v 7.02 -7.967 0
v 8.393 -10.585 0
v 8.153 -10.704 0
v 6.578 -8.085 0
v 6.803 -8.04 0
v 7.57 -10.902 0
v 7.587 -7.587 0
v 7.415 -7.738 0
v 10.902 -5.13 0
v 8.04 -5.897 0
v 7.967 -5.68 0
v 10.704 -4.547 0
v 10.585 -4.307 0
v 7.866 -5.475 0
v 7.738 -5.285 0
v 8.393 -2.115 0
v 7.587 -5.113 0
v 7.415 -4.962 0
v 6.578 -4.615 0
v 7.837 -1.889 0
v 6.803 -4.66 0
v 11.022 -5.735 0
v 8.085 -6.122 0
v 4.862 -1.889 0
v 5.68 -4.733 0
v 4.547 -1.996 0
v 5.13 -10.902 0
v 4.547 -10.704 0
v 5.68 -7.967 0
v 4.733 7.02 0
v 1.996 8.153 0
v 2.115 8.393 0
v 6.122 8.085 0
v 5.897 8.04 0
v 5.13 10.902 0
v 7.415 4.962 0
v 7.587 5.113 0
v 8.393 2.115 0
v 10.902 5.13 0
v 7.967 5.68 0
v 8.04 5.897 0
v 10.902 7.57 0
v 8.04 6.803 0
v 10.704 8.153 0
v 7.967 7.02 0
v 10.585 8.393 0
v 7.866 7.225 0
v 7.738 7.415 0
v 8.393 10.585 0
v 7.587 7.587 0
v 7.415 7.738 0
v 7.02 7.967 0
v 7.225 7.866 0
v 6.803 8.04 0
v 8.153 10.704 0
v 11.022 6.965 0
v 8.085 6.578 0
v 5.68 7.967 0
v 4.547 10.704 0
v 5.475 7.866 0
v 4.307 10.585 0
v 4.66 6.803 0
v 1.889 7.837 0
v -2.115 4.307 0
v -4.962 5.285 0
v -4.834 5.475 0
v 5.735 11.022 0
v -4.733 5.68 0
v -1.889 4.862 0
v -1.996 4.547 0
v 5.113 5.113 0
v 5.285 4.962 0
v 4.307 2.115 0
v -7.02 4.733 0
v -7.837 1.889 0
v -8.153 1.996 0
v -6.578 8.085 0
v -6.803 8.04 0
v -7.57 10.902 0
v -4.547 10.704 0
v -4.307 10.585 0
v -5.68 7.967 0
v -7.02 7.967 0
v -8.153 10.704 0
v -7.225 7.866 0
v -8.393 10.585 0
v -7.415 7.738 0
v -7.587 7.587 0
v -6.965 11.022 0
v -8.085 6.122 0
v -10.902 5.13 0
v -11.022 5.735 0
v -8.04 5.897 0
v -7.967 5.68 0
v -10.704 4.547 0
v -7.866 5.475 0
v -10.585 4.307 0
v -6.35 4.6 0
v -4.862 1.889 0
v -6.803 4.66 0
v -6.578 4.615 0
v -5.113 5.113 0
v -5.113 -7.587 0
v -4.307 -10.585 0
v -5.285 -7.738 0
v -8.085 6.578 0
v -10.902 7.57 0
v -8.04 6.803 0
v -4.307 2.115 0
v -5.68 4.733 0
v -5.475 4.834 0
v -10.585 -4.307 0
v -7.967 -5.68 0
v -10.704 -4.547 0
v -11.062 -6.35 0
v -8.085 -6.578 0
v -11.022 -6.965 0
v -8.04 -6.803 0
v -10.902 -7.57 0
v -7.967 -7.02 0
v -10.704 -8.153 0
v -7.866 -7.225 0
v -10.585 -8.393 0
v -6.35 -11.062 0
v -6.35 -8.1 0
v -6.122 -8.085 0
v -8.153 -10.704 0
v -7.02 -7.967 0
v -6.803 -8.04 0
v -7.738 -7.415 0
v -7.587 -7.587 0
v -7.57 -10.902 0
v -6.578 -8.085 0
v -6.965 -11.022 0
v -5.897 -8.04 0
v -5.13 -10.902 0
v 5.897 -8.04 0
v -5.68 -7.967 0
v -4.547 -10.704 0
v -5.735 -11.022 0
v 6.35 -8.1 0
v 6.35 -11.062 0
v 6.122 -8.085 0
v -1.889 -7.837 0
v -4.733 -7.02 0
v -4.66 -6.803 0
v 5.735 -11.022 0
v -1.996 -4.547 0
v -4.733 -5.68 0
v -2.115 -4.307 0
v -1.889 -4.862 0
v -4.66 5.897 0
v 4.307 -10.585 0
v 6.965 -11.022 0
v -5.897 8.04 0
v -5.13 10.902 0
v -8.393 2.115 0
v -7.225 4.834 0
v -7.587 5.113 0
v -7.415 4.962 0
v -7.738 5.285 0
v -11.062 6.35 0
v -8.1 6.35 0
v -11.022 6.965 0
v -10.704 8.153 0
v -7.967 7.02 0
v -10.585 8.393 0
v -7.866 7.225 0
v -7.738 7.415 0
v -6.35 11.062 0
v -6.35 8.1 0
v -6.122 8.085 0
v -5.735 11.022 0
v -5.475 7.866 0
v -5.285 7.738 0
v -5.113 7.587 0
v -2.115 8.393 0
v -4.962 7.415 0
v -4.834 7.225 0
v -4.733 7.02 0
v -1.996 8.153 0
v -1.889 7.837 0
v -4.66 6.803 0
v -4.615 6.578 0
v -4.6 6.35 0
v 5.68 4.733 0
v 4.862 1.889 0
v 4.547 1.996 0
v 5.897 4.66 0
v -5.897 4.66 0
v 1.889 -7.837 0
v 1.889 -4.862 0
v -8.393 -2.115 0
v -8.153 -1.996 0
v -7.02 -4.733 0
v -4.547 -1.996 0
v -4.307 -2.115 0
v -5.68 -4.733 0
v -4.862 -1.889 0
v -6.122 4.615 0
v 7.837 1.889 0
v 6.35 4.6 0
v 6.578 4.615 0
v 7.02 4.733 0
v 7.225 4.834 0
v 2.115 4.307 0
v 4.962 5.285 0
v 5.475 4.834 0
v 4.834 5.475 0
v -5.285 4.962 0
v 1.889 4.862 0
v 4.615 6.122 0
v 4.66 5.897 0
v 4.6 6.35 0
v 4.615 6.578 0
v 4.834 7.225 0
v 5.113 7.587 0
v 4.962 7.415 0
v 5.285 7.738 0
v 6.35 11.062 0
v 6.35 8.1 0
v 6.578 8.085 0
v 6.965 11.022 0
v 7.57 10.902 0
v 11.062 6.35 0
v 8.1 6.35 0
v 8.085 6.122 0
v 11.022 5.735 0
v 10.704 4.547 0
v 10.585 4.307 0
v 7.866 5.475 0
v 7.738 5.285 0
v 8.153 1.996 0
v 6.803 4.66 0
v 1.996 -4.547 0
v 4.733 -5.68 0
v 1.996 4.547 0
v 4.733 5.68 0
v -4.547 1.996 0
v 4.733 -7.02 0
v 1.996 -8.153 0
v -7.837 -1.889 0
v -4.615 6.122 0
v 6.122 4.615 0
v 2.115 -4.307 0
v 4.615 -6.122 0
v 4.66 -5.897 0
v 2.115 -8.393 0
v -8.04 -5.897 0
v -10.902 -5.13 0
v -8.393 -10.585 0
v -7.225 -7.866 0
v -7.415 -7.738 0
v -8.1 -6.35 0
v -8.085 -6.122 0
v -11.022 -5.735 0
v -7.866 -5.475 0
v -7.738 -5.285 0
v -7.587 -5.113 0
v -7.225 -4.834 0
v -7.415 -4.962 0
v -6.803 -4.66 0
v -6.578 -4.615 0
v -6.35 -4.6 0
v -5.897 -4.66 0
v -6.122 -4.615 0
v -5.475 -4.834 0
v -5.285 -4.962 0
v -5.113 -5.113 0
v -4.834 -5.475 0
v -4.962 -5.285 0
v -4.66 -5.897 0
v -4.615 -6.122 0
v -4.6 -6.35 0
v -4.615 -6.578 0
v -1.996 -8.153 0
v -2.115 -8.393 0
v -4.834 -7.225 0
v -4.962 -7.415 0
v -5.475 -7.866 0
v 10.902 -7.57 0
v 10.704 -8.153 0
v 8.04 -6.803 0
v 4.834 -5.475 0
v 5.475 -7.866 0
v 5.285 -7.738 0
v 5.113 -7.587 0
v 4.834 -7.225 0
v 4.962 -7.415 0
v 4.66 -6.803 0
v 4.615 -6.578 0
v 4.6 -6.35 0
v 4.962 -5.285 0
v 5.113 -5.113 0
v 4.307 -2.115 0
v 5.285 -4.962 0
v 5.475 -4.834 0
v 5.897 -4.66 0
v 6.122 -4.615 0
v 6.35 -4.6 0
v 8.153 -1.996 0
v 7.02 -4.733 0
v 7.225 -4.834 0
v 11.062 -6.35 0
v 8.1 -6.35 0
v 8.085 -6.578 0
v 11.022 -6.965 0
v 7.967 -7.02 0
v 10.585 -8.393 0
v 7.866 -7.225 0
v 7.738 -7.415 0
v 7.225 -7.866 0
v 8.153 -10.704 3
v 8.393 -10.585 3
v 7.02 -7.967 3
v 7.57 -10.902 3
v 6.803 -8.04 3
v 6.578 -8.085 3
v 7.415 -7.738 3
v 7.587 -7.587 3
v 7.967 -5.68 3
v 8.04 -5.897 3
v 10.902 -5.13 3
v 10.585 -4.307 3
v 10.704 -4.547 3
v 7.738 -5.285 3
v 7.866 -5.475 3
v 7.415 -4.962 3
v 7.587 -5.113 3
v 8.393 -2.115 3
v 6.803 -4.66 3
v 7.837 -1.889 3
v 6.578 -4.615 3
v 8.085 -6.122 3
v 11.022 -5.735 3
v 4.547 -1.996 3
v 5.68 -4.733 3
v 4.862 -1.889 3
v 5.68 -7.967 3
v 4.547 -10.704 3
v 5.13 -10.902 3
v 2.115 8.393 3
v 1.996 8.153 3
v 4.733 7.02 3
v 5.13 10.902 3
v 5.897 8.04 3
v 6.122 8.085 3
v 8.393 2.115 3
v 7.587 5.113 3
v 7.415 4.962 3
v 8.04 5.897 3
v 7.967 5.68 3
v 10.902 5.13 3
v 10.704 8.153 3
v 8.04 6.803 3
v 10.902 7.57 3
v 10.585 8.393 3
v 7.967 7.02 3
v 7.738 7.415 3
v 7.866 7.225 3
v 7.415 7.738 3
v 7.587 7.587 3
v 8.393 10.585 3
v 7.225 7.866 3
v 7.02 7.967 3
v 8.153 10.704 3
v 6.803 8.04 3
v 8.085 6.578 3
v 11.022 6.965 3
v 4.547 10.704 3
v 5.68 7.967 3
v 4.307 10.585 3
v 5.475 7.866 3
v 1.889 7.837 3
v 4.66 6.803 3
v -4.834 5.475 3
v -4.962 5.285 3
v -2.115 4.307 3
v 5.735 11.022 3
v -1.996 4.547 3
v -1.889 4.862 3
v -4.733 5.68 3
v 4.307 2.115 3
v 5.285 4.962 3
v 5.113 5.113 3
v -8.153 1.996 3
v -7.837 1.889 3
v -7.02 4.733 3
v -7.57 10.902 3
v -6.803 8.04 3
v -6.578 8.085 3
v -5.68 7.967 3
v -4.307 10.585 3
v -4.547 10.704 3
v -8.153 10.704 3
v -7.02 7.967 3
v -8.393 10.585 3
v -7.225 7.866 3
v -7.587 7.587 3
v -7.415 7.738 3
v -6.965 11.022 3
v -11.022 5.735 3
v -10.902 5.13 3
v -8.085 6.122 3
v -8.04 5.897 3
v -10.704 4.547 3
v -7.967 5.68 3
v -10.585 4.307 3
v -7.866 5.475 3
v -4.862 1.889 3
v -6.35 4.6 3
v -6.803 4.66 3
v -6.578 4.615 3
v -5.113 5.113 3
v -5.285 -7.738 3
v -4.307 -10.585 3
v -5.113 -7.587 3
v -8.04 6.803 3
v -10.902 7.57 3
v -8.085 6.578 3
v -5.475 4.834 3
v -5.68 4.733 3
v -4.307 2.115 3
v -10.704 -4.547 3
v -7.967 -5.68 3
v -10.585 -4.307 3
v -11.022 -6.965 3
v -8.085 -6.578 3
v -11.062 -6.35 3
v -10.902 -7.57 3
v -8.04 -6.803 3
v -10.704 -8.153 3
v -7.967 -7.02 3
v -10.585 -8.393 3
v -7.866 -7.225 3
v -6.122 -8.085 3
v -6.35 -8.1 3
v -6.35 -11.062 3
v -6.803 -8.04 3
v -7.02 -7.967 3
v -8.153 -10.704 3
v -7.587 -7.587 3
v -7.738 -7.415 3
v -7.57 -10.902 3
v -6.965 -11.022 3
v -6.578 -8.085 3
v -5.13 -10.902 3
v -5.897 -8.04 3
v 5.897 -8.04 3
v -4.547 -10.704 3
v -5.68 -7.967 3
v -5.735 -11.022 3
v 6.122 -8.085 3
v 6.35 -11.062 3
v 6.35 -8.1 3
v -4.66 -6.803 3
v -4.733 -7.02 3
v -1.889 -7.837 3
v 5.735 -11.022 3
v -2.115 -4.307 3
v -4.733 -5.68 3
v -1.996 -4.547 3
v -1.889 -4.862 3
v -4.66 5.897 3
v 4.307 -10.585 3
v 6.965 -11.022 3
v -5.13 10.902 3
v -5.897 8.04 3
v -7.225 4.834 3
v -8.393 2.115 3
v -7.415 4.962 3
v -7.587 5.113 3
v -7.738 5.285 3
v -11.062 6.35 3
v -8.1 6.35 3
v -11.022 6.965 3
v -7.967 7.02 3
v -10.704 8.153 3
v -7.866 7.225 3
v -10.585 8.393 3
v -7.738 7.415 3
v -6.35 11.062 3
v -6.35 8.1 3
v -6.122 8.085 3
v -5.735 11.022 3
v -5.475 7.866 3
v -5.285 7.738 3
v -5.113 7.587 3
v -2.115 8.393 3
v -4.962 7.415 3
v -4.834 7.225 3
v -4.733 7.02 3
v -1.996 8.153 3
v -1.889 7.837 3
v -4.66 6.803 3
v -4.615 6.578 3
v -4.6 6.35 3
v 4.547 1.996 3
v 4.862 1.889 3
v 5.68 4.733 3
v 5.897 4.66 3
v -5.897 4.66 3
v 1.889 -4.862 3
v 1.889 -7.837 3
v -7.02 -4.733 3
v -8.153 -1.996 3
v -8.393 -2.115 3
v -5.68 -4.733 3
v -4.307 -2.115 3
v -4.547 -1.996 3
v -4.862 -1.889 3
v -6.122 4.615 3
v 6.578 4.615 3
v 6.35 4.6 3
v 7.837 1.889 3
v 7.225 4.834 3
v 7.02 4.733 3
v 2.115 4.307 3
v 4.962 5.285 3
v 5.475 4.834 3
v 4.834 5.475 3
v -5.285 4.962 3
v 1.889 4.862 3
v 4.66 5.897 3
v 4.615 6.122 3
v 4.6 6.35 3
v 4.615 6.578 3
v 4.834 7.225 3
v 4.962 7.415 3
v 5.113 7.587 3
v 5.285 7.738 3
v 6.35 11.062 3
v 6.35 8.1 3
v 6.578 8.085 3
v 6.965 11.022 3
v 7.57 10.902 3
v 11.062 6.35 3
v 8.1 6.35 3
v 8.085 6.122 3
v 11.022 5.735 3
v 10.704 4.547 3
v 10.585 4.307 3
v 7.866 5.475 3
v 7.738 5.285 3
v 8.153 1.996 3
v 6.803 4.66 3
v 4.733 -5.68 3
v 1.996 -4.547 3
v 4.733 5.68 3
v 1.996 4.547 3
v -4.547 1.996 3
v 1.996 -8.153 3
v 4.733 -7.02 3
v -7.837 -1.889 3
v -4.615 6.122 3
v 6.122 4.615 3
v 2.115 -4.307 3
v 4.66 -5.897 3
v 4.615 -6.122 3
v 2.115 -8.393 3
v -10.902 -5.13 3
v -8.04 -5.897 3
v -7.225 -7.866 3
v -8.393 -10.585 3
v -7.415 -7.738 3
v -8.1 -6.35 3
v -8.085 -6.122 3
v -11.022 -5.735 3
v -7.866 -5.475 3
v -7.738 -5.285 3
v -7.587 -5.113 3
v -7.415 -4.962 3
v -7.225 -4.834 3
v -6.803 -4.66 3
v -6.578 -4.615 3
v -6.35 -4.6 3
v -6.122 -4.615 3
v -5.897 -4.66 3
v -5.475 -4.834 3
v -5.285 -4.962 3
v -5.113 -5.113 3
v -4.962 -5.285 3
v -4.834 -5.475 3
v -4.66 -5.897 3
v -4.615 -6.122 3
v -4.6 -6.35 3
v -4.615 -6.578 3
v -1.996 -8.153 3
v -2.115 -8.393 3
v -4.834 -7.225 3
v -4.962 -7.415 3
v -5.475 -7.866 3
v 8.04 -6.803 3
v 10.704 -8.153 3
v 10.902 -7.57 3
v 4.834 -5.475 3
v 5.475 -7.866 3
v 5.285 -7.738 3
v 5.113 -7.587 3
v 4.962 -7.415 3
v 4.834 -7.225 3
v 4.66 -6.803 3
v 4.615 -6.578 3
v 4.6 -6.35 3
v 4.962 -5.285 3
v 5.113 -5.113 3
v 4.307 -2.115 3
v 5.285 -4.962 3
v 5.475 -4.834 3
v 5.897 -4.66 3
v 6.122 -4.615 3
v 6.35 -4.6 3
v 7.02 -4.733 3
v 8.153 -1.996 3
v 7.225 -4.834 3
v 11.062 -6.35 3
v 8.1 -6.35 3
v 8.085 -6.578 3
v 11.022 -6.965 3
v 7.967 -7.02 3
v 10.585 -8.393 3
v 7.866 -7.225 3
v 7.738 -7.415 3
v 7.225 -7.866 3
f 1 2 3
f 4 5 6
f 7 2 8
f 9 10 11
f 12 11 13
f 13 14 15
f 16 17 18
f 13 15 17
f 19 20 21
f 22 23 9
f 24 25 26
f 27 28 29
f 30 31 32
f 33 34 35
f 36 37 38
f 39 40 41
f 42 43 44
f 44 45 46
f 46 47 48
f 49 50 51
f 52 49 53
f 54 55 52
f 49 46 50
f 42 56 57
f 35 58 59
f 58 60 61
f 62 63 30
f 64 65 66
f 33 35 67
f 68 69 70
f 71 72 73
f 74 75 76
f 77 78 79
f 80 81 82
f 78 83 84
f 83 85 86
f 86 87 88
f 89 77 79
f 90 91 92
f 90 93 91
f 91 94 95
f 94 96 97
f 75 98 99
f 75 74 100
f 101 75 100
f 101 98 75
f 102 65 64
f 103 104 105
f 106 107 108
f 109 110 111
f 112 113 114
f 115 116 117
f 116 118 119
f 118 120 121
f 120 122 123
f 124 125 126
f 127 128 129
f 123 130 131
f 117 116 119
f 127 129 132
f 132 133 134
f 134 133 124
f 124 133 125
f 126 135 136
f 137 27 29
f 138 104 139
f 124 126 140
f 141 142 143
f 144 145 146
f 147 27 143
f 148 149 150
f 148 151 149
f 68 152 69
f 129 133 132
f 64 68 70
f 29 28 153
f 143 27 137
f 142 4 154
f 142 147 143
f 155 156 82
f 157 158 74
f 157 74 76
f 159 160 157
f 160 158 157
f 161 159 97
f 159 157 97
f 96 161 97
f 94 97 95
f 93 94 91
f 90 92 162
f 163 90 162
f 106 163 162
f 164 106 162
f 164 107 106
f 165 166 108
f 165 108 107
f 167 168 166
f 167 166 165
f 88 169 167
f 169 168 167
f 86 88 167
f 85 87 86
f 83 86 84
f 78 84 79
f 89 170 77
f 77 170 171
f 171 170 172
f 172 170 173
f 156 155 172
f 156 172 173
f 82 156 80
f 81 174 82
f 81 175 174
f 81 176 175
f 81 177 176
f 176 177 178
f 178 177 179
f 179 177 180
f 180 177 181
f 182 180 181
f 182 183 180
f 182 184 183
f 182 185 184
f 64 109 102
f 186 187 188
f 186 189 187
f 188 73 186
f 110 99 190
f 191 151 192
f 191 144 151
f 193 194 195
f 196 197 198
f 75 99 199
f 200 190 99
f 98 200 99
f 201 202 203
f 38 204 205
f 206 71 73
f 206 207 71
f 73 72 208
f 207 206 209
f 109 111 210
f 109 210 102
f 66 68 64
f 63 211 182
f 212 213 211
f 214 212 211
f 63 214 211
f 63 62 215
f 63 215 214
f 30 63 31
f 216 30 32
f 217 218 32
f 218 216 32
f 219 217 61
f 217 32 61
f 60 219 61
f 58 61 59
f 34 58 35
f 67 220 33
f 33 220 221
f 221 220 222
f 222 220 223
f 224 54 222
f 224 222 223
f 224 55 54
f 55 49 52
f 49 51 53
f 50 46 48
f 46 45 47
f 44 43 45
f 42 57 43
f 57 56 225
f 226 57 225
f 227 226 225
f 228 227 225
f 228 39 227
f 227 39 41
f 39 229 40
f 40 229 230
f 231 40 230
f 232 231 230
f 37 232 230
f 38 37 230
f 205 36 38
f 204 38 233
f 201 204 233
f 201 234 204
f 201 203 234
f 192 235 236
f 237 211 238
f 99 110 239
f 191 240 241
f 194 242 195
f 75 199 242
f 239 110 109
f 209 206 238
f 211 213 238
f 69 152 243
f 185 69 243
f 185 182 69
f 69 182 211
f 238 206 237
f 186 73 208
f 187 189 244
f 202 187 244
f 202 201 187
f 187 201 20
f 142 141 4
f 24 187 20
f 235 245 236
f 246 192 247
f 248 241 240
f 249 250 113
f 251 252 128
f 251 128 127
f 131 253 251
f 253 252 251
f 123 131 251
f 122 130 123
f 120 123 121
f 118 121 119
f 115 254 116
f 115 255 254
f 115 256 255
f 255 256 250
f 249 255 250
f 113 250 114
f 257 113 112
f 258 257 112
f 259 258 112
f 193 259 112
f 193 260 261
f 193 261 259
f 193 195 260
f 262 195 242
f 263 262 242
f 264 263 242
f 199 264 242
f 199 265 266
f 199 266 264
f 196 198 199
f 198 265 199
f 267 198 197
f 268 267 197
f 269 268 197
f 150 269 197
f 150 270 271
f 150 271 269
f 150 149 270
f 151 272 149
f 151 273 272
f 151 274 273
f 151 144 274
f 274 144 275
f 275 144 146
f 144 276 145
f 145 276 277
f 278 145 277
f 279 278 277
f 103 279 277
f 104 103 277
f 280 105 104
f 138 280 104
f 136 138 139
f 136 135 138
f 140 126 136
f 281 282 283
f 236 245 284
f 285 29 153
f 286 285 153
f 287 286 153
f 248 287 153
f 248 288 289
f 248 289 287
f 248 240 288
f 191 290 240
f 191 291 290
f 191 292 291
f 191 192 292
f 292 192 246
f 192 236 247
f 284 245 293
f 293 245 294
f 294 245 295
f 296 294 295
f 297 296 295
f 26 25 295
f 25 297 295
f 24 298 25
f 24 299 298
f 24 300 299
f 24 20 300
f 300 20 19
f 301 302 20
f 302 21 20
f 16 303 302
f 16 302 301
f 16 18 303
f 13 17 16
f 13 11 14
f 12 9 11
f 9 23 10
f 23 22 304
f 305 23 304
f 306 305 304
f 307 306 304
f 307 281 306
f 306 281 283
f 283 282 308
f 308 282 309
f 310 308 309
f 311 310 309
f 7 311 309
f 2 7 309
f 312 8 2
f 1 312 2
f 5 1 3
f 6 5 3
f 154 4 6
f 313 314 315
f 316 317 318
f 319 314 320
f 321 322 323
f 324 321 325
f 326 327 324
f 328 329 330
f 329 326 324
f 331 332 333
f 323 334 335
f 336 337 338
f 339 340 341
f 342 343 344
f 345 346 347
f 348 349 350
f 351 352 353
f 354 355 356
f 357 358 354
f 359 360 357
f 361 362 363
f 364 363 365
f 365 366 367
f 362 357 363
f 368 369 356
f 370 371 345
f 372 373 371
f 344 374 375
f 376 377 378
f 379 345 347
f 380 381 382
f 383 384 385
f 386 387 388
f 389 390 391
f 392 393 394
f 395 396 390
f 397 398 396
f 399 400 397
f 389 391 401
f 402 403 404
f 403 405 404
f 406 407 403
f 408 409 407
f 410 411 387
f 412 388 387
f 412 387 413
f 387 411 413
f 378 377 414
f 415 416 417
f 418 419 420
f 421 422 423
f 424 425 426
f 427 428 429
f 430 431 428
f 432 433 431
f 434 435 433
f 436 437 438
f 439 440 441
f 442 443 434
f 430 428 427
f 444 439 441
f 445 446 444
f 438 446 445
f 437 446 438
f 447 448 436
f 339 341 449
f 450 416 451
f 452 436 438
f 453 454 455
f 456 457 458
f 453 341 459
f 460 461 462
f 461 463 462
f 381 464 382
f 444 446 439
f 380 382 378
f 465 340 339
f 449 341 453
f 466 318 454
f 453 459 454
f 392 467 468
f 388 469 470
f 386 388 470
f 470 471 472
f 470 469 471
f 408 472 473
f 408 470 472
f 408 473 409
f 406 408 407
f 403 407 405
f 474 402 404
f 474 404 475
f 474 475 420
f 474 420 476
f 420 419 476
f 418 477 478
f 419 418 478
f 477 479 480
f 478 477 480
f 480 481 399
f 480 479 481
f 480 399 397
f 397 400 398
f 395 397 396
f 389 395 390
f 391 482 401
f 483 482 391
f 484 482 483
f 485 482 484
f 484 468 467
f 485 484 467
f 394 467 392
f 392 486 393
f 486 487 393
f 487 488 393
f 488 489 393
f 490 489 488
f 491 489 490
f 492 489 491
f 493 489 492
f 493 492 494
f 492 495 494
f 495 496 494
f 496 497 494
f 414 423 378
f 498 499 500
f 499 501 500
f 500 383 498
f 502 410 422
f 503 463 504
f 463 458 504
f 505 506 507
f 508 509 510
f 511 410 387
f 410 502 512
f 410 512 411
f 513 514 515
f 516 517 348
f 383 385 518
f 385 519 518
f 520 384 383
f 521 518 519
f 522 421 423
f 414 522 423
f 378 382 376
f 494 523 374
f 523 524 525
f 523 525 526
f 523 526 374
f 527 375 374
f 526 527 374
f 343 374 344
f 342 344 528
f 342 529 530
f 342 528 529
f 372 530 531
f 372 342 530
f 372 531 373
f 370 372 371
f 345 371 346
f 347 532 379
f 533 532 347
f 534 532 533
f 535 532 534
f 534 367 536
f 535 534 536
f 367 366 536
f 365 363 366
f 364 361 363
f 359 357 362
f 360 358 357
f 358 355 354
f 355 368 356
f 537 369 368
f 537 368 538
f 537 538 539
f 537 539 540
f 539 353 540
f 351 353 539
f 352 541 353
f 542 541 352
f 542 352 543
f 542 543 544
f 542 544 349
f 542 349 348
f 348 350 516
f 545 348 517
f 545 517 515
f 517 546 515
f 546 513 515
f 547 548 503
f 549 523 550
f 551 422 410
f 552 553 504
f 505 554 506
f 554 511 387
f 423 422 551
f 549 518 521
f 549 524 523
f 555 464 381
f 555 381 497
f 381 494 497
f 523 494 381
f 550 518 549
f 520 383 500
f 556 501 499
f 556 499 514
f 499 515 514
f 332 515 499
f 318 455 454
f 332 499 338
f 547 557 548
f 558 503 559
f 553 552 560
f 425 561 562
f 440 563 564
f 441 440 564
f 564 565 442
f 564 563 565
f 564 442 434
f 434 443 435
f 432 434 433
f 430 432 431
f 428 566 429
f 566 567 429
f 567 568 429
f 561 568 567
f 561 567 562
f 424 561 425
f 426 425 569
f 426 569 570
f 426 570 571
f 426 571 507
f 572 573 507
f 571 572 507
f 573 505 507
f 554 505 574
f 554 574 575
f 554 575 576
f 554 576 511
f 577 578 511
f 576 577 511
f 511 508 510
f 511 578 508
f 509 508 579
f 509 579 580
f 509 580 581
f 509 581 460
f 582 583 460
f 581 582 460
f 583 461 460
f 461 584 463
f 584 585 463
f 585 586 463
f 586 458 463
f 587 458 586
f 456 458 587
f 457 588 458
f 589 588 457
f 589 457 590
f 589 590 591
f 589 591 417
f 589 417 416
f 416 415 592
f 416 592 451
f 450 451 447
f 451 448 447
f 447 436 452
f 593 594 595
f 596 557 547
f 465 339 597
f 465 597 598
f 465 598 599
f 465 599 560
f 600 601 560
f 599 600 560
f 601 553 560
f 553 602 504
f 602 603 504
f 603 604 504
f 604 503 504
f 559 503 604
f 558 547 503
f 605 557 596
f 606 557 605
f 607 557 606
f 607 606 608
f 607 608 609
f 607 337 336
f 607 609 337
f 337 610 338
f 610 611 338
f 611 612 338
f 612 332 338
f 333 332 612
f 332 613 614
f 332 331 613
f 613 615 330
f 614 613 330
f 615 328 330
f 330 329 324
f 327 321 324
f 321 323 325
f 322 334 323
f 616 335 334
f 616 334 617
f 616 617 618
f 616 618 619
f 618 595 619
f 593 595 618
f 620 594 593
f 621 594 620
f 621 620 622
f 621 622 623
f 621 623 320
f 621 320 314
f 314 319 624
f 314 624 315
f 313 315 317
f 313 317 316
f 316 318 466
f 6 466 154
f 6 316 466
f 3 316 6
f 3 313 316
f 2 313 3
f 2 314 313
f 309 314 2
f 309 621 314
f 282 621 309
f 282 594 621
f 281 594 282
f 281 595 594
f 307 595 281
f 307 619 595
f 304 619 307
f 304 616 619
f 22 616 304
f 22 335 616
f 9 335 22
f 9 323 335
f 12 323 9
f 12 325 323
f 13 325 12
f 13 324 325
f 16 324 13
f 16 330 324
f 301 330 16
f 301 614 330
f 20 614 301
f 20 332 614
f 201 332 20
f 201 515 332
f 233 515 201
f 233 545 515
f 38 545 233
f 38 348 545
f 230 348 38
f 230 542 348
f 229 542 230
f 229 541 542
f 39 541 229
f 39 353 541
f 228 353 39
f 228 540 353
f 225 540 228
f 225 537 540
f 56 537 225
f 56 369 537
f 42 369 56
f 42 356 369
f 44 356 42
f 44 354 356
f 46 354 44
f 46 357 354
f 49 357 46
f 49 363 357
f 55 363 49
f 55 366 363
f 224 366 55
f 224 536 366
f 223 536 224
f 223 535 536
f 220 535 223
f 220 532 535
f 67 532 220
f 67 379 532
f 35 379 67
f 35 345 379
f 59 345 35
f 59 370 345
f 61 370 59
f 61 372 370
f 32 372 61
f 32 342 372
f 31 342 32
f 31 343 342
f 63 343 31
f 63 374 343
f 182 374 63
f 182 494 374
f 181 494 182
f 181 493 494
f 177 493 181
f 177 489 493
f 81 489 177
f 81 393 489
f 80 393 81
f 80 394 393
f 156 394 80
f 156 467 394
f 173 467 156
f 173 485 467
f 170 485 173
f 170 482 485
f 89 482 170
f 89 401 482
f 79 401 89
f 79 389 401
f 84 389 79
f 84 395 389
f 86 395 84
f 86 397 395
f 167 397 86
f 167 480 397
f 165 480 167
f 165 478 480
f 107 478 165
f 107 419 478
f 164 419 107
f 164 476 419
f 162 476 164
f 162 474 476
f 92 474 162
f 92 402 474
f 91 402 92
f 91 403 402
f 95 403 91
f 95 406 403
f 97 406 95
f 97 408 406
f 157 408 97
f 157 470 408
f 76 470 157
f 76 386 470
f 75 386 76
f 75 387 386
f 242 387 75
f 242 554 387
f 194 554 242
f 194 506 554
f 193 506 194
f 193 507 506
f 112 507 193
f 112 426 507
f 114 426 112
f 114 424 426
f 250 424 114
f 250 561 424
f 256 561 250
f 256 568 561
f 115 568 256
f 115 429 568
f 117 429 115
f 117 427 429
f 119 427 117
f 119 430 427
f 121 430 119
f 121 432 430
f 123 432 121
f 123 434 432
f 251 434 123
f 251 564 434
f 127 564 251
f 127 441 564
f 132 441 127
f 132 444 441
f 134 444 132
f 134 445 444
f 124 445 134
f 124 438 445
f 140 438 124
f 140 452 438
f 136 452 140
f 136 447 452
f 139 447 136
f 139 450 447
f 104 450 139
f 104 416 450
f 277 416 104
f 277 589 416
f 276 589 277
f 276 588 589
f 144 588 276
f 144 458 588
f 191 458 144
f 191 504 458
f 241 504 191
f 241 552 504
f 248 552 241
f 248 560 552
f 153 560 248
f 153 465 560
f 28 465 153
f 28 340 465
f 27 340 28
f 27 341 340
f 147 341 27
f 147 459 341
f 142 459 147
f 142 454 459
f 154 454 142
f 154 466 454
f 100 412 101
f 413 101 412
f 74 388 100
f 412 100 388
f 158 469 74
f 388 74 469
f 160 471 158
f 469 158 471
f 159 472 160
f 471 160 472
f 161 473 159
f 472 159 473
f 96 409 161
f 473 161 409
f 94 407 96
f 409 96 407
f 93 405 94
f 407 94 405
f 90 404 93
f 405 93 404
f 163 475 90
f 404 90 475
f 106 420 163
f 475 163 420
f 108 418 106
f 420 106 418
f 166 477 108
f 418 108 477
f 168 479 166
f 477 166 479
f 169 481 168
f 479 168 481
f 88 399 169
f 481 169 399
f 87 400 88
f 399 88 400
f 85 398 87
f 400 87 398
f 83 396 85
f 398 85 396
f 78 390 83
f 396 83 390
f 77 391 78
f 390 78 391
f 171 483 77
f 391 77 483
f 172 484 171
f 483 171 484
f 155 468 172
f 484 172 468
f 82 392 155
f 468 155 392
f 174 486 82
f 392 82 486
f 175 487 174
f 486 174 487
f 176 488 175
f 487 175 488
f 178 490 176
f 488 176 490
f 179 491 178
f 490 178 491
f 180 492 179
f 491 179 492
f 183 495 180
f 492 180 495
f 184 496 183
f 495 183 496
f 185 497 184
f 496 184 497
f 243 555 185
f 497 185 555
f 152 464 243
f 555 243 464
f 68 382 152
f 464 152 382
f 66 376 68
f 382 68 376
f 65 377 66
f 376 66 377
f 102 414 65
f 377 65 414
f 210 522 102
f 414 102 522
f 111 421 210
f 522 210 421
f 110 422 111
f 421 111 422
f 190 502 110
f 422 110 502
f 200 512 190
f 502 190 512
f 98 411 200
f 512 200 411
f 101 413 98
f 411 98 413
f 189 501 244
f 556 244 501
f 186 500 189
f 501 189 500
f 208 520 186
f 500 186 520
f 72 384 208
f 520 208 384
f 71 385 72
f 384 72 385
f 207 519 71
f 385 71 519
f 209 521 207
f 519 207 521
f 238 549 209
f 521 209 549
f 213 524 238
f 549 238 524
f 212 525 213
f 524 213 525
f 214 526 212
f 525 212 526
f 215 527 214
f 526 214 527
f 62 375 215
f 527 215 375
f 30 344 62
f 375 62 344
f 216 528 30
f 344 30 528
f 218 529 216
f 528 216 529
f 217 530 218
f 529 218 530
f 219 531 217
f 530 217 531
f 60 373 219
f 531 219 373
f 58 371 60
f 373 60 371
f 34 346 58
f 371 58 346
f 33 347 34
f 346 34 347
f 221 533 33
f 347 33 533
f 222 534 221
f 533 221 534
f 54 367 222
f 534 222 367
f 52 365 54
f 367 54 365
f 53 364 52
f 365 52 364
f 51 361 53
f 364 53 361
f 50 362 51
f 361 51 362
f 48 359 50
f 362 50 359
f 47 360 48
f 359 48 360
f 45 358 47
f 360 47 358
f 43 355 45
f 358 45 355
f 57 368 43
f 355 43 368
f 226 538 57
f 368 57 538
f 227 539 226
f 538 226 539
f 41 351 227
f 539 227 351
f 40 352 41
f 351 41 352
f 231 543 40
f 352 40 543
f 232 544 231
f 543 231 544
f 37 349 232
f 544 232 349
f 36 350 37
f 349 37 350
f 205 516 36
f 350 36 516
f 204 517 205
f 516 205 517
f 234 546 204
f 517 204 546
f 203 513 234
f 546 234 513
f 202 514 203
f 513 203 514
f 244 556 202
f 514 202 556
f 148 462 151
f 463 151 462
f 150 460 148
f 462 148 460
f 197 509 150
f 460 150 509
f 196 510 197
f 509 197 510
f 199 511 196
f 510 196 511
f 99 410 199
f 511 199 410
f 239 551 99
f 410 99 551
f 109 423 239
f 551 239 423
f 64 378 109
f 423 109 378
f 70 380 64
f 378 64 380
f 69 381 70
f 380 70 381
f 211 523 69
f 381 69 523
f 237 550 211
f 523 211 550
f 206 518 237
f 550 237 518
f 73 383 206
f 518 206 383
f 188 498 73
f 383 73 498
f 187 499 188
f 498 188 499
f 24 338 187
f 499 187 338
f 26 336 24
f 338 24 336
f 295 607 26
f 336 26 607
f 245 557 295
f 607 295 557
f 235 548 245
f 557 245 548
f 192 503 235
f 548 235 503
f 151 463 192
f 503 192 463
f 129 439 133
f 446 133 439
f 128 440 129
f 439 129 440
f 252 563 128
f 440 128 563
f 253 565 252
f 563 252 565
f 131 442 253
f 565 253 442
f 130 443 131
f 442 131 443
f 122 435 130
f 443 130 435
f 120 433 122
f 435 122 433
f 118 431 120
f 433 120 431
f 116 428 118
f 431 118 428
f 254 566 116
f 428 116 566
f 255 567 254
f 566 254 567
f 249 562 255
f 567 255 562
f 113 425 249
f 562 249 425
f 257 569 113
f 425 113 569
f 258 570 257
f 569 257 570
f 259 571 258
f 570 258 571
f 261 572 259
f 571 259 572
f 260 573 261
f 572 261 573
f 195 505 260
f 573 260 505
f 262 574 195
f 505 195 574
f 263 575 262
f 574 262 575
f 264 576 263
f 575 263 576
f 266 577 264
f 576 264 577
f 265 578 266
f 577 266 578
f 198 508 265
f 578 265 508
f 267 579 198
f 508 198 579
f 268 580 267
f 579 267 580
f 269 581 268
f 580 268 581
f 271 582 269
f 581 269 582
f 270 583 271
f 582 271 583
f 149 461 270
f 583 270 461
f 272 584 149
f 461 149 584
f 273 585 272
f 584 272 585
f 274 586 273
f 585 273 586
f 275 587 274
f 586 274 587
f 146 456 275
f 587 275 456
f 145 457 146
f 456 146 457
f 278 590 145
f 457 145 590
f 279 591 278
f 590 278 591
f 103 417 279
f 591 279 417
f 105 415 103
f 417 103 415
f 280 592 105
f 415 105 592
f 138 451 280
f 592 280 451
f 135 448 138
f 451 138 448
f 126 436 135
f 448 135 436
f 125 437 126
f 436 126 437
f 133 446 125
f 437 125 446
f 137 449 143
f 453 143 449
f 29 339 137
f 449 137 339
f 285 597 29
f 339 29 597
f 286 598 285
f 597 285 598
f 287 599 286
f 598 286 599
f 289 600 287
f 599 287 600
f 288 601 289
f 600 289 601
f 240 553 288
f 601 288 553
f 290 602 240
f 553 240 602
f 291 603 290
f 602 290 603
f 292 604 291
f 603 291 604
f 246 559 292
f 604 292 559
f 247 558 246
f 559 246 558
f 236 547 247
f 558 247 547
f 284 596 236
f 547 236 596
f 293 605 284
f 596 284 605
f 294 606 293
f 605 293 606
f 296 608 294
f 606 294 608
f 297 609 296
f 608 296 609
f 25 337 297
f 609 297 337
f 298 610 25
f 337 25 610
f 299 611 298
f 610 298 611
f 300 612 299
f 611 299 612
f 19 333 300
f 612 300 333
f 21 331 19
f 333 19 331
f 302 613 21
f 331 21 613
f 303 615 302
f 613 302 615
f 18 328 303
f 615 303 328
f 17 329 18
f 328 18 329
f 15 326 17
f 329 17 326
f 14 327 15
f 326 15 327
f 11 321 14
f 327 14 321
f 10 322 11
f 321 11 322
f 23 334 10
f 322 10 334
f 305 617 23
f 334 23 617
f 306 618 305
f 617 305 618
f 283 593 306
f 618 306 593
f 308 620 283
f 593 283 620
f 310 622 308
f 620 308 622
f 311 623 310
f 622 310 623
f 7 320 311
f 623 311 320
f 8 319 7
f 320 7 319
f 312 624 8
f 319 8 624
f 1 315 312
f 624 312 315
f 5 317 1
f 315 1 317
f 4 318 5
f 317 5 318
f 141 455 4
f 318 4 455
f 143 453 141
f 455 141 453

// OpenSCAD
// file: ../lib/TOGShapeLib-v1.scad
module tog_shapelib_rounded_beveled_square(size, bevel_size, rounding_radius, offset=0) {
	// Could special-case these, but in the meantime:
	assert(bevel_size > 0);
	// Make sure things don't go negative:
	assert(size[0]/2 - bevel_size - rounding_radius*0.414 >= 0);
	assert(size[1]/2 - bevel_size - rounding_radius*0.414 >= 0);

	hull() for( ym=[-1,1] ) for( xm=[-1,1] ) {
		translate([
			xm*(size[0]/2 - rounding_radius),
			ym*(size[1]/2 - bevel_size - rounding_radius*0.414),
		]) circle(r=rounding_radius+offset);
		translate([
			xm*(size[0]/2 - bevel_size - rounding_radius*0.414),
			ym*(size[1]/2 - rounding_radius),
		]) circle(r=rounding_radius+offset);
	}
}
// file: ../lib/TOGridPileLib-v2.scad
// 12.7mm = 1/2"
atom_pitch        = 12.7000; // 0.0001
// 9.5245mm = 3/8"
column_diameter   =  9.5245; // 0.0001
// 1.5875mm = 1/16"
min_corner_radius =  1.5875; // 0.0001

use <TOGShapeLib-v1.scad>

module togridpile2_atom_column_footprint(column_style="v8", atom_pitch=atom_pitch, column_diameter=column_diameter, min_corner_radius=min_corner_radius, offset=0) {
	if( column_style == "v6" ) {
		column_inset = (atom_pitch - column_diameter)/2;
		// (0.707-0.414)*min_corner_radius should be equivalent to the old _adj=... hack
		tog_shapelib_rounded_beveled_square([column_diameter, column_diameter], column_inset*2*0.707 + (0.707-0.414)*min_corner_radius, min_corner_radius, offset);
	} else if( column_style == "v6.1" ) {
		column_inset = (atom_pitch - column_diameter)/2;
		tog_shapelib_rounded_beveled_square([column_diameter, column_diameter], column_inset*2*0.707, min_corner_radius, offset);
	} else if( column_style == "v6.2" ) {
		// similar to v6 or v6.1, but with deep-enough bevels to fit another diagonally, as in v8.4
		column_inset = (atom_pitch - column_diameter)/2;
		tog_shapelib_rounded_beveled_square([column_diameter, column_diameter], atom_pitch/2-(atom_pitch-column_diameter), min_corner_radius, offset);
	} else if( column_style == "v8.0" ) {
		circle(d=column_diameter+offset);
	} else if( column_style == "v8.4" ) {
		// rounded but with corners trimmed so another can fit between diagonally
		intersection() {
			circle(d=column_diameter+offset);
			rotate([0,0,45]) square(atom_pitch*0.707+offset, center=true);
		}
	} else {
		assert(false, str("Unrecognized column column_style: '", column_style, "'"));
	}
}
// main file
margin = 0.1;
atom_pitch = 12.7;

$fn = 48;

module __end_params() { }

use <../lib/TOGridPileLib-v2.scad>

inch  = 25.4;

linear_extrude(3) {
	difference() {
		union() {
			for( xm=[-0.5, 0.5] ) for( ym=[-0.5, 0.5] ) {
				translate([xm*atom_pitch, ym*atom_pitch]) togridpile2_atom_column_footprint("v8.4", atom_pitch=atom_pitch, offset=-margin);
			}
			for( rot=[0,90,180,270] ) {
				rotate([0,0,rot]) translate([atom_pitch/2,0,0]) square([1/8*inch - margin*2, atom_pitch], center=true);
			}
		}
		
		for( xm=[-0.5, 0.5] ) for( ym=[-0.5, 0.5] ) {
			translate([xm*atom_pitch, ym*atom_pitch]) circle(d=3.5);
		}
	}
}
